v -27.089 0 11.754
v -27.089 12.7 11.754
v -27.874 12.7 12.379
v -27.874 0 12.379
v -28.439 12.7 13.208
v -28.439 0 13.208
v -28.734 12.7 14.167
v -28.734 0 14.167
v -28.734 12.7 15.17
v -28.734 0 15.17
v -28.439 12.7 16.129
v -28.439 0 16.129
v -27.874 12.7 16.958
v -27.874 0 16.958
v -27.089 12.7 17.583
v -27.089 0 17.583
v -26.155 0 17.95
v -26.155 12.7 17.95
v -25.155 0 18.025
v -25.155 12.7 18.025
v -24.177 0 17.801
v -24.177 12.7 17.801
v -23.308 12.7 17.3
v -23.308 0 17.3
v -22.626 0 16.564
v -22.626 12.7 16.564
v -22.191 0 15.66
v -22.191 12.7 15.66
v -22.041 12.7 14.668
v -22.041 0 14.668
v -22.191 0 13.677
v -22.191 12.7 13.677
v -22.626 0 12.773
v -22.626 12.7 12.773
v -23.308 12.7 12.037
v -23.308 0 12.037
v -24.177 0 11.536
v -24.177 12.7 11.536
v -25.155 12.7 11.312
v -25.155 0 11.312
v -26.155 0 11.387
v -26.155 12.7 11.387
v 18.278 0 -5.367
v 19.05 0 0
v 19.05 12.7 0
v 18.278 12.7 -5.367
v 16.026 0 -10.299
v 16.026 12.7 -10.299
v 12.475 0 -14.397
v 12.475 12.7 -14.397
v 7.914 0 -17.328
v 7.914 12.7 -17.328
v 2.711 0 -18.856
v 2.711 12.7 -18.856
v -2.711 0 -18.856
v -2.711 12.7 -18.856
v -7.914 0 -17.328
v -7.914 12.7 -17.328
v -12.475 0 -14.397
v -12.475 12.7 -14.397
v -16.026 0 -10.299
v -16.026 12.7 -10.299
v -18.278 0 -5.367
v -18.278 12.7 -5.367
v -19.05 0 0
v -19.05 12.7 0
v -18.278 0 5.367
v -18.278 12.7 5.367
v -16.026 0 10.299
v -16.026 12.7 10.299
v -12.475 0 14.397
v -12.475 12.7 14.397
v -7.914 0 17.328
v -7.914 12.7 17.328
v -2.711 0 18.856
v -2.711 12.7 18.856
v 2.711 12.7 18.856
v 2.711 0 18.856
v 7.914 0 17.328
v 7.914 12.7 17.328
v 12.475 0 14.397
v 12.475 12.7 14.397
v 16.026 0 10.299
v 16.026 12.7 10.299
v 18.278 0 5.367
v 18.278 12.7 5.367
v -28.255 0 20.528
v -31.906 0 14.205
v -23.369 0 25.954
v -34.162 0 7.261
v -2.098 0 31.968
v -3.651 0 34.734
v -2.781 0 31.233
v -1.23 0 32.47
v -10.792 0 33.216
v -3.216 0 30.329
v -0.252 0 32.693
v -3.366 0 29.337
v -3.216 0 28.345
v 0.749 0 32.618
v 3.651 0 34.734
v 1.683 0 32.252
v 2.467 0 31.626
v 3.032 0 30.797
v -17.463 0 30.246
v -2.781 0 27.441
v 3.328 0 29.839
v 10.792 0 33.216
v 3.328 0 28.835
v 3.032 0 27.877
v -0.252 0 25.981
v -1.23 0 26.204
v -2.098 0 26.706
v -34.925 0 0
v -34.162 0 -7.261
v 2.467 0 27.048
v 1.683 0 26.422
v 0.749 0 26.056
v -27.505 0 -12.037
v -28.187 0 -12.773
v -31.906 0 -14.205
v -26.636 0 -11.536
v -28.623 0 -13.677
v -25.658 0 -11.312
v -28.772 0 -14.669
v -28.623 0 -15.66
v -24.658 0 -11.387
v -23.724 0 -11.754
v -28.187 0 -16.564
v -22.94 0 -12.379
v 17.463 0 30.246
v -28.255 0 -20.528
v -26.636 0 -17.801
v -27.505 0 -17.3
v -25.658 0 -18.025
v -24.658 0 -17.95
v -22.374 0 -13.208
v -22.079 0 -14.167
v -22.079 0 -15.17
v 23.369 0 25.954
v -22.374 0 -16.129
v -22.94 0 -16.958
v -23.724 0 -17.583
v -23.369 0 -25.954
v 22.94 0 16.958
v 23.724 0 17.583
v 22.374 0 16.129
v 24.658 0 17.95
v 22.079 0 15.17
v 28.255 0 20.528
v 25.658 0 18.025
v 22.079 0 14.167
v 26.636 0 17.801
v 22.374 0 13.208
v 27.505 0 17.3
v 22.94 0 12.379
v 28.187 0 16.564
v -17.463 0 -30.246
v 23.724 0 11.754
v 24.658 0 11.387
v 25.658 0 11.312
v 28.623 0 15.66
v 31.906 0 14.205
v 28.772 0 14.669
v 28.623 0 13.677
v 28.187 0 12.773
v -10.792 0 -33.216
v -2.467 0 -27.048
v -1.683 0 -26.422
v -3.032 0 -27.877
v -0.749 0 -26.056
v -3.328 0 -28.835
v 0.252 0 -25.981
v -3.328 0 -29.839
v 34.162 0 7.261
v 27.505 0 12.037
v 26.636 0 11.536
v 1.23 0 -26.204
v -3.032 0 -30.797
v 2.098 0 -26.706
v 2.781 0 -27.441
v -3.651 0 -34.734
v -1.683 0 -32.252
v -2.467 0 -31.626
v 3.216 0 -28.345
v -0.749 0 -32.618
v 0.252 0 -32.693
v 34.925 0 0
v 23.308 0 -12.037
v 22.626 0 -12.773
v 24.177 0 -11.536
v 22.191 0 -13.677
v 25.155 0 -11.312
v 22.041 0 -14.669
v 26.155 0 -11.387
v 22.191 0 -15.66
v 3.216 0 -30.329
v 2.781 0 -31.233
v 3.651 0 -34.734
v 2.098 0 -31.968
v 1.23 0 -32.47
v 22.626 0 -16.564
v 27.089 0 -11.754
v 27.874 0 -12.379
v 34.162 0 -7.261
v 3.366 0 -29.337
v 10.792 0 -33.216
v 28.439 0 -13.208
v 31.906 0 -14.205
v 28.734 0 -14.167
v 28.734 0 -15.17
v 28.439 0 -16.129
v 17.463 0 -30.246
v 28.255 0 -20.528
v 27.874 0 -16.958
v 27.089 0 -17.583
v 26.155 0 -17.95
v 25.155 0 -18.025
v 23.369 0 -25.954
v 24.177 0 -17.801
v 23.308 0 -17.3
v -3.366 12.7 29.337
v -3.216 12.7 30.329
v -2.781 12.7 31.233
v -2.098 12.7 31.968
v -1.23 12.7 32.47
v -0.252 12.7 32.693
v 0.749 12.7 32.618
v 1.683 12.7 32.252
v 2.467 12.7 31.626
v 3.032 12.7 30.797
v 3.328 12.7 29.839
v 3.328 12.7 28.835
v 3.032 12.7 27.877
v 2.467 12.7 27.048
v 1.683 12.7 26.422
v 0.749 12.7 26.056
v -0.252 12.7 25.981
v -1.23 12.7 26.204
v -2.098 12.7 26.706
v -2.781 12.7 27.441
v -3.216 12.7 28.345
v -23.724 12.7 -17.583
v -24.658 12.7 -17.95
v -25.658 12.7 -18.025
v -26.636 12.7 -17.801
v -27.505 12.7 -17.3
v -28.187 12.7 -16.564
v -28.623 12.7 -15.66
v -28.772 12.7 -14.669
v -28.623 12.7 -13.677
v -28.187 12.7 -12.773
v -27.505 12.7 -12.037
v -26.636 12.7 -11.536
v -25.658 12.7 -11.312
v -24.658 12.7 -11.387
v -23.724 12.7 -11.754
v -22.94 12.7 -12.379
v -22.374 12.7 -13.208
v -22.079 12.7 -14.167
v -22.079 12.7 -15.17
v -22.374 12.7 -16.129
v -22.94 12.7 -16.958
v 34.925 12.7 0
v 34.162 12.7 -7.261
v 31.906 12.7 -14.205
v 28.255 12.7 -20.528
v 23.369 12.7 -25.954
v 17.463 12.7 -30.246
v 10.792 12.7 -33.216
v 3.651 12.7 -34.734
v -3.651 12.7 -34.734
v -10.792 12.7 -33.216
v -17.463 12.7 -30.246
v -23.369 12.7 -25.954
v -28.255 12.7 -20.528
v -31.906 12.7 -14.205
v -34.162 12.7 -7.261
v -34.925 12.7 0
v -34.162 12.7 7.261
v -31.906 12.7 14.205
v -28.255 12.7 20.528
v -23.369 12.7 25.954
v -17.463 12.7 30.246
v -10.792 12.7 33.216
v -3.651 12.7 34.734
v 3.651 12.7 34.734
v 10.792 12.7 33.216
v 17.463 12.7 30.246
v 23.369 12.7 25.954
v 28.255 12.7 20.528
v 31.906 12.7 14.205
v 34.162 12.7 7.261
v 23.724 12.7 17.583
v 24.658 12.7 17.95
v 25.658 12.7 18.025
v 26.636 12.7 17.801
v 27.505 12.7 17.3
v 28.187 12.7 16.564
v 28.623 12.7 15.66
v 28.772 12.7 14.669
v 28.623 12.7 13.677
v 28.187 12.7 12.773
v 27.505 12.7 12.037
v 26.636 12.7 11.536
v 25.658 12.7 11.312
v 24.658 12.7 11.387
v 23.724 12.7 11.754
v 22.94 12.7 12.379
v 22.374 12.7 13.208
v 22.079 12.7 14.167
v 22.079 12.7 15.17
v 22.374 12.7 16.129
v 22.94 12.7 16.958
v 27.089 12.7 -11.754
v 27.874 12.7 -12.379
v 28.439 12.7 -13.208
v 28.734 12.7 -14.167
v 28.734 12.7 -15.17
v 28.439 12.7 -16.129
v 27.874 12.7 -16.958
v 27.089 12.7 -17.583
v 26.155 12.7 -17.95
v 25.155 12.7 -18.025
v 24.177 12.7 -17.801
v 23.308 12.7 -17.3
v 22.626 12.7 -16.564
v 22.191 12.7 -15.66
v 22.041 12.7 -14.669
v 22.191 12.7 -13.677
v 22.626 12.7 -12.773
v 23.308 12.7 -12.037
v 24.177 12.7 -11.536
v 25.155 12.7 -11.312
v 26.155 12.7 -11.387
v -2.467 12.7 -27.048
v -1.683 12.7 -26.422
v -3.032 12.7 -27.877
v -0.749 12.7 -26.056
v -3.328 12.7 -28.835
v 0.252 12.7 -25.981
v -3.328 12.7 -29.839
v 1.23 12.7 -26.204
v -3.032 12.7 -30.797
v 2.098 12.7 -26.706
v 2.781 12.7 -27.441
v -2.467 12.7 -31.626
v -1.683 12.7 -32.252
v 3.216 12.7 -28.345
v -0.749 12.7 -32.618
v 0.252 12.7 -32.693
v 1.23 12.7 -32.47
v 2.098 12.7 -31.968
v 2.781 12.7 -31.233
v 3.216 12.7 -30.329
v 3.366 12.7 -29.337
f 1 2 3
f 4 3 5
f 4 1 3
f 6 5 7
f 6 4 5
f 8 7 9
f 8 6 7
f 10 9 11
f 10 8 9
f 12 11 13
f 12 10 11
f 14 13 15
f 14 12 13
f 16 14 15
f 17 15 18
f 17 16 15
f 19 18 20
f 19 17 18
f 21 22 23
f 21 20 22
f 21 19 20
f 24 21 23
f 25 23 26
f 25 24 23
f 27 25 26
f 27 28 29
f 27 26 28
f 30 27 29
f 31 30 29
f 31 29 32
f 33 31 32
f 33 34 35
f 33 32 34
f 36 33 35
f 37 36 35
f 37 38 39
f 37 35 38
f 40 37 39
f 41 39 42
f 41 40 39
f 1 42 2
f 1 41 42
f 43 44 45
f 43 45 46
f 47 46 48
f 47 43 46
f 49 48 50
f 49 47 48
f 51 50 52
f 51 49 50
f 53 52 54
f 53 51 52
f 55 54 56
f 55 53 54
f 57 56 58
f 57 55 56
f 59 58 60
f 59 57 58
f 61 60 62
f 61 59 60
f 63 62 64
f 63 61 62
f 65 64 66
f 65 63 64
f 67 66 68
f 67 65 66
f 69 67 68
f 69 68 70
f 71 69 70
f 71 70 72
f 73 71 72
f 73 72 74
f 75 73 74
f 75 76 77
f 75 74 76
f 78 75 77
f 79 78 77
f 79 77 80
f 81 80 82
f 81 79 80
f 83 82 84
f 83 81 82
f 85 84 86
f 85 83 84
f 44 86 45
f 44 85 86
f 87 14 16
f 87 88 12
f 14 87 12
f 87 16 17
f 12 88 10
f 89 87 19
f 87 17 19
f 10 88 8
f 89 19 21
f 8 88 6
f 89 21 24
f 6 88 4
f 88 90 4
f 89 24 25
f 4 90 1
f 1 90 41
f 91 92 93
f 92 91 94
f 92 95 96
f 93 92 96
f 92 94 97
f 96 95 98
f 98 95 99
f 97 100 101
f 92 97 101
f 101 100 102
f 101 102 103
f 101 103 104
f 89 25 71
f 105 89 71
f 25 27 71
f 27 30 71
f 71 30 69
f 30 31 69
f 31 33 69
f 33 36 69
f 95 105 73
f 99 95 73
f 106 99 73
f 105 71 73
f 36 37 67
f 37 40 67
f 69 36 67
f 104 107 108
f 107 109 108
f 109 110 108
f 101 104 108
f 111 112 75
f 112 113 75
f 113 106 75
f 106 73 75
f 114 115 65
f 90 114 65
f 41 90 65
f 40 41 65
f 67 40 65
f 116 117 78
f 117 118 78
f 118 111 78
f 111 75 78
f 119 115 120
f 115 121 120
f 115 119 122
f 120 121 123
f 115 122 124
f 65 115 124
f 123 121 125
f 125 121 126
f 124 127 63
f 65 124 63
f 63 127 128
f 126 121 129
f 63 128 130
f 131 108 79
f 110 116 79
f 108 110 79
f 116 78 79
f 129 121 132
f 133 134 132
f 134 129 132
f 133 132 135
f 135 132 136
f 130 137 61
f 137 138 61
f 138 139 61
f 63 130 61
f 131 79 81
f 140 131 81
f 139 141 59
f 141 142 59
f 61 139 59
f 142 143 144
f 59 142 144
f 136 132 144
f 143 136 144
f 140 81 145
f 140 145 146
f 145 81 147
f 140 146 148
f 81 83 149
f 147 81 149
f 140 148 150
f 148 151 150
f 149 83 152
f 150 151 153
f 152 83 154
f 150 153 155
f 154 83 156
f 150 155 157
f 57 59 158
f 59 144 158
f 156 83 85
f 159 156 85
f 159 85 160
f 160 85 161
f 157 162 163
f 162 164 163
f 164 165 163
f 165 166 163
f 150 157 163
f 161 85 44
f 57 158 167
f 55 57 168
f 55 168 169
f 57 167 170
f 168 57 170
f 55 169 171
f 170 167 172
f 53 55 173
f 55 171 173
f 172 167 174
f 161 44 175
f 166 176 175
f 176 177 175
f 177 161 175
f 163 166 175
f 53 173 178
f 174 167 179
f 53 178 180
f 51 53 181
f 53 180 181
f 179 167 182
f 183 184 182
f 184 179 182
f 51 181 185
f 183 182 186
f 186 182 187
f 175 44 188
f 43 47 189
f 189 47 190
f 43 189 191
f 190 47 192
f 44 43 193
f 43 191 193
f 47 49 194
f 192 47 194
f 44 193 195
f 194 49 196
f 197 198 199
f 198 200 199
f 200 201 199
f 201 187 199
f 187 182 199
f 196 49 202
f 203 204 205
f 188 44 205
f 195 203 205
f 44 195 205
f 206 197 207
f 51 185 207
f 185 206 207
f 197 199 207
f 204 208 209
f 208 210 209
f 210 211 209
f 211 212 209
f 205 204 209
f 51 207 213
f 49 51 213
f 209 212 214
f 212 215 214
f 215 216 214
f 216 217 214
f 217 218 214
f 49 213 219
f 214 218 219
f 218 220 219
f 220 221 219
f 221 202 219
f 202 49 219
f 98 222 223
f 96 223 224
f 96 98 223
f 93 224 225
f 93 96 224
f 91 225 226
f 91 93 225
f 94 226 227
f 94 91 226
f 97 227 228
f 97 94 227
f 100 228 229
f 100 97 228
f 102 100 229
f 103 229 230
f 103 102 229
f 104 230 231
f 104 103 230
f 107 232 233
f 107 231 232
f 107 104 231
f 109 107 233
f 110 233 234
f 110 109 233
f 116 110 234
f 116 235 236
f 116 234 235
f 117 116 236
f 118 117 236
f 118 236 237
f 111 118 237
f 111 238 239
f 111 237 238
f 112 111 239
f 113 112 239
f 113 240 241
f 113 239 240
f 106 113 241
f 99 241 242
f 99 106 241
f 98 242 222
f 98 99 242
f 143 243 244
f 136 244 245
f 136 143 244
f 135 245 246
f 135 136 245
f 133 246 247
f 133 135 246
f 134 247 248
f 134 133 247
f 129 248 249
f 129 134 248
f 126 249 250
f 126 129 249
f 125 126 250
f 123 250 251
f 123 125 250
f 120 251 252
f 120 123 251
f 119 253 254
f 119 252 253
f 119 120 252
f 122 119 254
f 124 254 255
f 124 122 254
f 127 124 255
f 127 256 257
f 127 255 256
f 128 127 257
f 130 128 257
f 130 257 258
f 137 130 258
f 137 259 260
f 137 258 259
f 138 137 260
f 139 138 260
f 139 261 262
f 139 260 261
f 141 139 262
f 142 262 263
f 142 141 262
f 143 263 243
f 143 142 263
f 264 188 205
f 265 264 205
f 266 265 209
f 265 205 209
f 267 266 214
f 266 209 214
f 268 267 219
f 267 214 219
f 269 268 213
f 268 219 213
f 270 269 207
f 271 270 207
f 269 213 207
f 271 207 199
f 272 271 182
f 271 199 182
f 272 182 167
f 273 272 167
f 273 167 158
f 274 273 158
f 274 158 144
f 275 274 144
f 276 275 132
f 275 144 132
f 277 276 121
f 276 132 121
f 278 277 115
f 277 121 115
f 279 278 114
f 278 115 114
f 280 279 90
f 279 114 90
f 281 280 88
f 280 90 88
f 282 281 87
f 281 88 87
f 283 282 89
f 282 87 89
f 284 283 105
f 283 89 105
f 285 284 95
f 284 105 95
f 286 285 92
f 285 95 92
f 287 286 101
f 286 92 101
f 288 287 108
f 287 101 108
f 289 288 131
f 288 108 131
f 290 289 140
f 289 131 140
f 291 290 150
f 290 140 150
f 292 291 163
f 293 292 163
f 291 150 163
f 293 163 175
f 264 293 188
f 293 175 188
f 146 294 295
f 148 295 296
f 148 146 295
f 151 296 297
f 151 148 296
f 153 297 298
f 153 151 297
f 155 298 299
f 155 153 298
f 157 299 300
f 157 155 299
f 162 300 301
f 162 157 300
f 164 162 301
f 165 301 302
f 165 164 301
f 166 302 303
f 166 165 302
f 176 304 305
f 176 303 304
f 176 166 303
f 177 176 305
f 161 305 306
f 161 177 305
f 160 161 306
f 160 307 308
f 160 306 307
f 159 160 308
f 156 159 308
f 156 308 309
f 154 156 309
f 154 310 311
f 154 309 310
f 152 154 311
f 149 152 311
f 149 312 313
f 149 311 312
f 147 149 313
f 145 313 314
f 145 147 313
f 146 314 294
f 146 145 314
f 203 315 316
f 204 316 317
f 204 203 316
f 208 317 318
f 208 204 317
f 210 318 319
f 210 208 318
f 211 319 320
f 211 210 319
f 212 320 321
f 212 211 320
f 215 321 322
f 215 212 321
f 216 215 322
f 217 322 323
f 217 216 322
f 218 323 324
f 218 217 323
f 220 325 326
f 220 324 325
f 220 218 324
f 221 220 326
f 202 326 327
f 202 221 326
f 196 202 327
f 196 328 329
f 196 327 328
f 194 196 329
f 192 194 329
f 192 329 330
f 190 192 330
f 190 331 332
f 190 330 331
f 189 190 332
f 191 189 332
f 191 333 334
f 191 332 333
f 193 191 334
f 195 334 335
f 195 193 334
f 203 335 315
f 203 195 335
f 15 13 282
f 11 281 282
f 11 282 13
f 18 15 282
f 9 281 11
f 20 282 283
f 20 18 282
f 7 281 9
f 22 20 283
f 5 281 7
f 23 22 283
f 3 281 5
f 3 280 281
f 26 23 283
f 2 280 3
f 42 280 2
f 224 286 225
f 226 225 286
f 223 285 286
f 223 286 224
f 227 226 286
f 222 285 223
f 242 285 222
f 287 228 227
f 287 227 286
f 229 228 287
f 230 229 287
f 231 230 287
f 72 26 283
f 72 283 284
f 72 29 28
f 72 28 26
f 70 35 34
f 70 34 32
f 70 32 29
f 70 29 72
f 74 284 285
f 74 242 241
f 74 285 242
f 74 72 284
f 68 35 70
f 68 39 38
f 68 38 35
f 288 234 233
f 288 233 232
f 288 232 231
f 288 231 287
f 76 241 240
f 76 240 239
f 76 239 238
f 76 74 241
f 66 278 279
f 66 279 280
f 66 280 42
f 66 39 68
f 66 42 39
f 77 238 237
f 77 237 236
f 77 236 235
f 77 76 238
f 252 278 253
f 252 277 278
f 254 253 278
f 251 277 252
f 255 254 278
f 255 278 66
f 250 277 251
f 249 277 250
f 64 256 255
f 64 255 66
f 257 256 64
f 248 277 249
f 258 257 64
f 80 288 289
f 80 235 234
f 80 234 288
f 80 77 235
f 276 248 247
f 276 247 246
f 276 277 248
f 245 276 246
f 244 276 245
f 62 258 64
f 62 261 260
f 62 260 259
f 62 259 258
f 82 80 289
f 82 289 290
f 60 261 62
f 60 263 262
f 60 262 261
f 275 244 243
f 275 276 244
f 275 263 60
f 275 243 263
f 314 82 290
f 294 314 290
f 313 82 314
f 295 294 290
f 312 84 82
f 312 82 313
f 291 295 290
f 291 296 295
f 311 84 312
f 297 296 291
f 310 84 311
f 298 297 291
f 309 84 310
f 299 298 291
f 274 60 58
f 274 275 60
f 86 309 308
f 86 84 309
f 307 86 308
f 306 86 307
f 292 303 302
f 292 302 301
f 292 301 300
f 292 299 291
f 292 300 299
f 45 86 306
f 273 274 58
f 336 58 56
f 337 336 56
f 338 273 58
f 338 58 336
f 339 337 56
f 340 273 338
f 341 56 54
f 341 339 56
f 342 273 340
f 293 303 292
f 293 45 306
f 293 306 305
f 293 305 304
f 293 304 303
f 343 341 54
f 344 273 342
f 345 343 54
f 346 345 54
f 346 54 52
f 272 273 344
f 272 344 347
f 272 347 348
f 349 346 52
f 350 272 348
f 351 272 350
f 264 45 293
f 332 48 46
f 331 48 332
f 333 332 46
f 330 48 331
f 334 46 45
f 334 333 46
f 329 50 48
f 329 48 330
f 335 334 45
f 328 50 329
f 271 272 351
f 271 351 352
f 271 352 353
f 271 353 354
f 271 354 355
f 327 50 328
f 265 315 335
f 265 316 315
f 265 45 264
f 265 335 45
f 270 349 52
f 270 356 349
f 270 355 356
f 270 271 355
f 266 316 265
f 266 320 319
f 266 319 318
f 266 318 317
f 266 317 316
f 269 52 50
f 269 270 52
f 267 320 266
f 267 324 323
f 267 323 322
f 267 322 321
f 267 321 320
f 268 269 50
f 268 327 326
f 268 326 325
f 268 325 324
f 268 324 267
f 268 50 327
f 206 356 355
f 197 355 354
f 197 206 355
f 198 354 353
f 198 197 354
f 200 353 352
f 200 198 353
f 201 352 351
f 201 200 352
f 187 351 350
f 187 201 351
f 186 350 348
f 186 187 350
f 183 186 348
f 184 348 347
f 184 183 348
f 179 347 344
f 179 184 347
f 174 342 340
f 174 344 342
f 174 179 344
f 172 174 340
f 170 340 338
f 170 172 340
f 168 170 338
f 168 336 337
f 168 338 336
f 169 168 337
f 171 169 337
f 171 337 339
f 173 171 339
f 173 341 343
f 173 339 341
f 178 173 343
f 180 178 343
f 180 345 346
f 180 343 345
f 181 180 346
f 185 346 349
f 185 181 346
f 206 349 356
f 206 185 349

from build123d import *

# Parameters (mm, degrees)
SKETCH1_R          = 34.925
EXTRUDE1_DEPTH     = 12.7
SKETCH2_R          = 19.05
CUT_EXTRUDE1_DEPTH = 13.7
SKETCH3_R          = 3.3655
CUT_EXTRUDE2_DEPTH = 13.7
CIRPATTERN1_COUNT  = 6


with BuildPart() as part:
    # Sketch1 → Extrude1 (new body)
    with BuildSketch(Plane(origin=(0, 0, 0), x_dir=(1, 0, 0), z_dir=(0, 1, 0))):
        Circle(SKETCH1_R)
    extrude(amount=EXTRUDE1_DEPTH)

    # Sketch2 → Cut-Extrude1 (cut, through all)
    with BuildSketch(Plane(origin=(0, 0, 0), x_dir=(1, 0, 0), z_dir=(0, 1, 0))):
        Circle(SKETCH2_R)
    extrude(amount=CUT_EXTRUDE1_DEPTH, mode=Mode.SUBTRACT)

    # Sketch3 → Cut-Extrude2 (cut, through all)
    with BuildSketch(Plane(origin=(0, 0, 0), x_dir=(1, 0, 0), z_dir=(0, 1, 0))):
        with Locations((0, 29.337)):
            Circle(SKETCH3_R)
    cut_extrude2 = extrude(amount=CUT_EXTRUDE2_DEPTH, mode=Mode.SUBTRACT)

    # CirPattern1: Cut-Extrude2 ×6 about axis
    cirpattern1_axis = Axis((0, 0, 0), (0, 1, 0))
    for i in range(1, CIRPATTERN1_COUNT):
        add(cut_extrude2.rotate(cirpattern1_axis, i * 360 / CIRPATTERN1_COUNT), mode=Mode.SUBTRACT)


solid = part.part
